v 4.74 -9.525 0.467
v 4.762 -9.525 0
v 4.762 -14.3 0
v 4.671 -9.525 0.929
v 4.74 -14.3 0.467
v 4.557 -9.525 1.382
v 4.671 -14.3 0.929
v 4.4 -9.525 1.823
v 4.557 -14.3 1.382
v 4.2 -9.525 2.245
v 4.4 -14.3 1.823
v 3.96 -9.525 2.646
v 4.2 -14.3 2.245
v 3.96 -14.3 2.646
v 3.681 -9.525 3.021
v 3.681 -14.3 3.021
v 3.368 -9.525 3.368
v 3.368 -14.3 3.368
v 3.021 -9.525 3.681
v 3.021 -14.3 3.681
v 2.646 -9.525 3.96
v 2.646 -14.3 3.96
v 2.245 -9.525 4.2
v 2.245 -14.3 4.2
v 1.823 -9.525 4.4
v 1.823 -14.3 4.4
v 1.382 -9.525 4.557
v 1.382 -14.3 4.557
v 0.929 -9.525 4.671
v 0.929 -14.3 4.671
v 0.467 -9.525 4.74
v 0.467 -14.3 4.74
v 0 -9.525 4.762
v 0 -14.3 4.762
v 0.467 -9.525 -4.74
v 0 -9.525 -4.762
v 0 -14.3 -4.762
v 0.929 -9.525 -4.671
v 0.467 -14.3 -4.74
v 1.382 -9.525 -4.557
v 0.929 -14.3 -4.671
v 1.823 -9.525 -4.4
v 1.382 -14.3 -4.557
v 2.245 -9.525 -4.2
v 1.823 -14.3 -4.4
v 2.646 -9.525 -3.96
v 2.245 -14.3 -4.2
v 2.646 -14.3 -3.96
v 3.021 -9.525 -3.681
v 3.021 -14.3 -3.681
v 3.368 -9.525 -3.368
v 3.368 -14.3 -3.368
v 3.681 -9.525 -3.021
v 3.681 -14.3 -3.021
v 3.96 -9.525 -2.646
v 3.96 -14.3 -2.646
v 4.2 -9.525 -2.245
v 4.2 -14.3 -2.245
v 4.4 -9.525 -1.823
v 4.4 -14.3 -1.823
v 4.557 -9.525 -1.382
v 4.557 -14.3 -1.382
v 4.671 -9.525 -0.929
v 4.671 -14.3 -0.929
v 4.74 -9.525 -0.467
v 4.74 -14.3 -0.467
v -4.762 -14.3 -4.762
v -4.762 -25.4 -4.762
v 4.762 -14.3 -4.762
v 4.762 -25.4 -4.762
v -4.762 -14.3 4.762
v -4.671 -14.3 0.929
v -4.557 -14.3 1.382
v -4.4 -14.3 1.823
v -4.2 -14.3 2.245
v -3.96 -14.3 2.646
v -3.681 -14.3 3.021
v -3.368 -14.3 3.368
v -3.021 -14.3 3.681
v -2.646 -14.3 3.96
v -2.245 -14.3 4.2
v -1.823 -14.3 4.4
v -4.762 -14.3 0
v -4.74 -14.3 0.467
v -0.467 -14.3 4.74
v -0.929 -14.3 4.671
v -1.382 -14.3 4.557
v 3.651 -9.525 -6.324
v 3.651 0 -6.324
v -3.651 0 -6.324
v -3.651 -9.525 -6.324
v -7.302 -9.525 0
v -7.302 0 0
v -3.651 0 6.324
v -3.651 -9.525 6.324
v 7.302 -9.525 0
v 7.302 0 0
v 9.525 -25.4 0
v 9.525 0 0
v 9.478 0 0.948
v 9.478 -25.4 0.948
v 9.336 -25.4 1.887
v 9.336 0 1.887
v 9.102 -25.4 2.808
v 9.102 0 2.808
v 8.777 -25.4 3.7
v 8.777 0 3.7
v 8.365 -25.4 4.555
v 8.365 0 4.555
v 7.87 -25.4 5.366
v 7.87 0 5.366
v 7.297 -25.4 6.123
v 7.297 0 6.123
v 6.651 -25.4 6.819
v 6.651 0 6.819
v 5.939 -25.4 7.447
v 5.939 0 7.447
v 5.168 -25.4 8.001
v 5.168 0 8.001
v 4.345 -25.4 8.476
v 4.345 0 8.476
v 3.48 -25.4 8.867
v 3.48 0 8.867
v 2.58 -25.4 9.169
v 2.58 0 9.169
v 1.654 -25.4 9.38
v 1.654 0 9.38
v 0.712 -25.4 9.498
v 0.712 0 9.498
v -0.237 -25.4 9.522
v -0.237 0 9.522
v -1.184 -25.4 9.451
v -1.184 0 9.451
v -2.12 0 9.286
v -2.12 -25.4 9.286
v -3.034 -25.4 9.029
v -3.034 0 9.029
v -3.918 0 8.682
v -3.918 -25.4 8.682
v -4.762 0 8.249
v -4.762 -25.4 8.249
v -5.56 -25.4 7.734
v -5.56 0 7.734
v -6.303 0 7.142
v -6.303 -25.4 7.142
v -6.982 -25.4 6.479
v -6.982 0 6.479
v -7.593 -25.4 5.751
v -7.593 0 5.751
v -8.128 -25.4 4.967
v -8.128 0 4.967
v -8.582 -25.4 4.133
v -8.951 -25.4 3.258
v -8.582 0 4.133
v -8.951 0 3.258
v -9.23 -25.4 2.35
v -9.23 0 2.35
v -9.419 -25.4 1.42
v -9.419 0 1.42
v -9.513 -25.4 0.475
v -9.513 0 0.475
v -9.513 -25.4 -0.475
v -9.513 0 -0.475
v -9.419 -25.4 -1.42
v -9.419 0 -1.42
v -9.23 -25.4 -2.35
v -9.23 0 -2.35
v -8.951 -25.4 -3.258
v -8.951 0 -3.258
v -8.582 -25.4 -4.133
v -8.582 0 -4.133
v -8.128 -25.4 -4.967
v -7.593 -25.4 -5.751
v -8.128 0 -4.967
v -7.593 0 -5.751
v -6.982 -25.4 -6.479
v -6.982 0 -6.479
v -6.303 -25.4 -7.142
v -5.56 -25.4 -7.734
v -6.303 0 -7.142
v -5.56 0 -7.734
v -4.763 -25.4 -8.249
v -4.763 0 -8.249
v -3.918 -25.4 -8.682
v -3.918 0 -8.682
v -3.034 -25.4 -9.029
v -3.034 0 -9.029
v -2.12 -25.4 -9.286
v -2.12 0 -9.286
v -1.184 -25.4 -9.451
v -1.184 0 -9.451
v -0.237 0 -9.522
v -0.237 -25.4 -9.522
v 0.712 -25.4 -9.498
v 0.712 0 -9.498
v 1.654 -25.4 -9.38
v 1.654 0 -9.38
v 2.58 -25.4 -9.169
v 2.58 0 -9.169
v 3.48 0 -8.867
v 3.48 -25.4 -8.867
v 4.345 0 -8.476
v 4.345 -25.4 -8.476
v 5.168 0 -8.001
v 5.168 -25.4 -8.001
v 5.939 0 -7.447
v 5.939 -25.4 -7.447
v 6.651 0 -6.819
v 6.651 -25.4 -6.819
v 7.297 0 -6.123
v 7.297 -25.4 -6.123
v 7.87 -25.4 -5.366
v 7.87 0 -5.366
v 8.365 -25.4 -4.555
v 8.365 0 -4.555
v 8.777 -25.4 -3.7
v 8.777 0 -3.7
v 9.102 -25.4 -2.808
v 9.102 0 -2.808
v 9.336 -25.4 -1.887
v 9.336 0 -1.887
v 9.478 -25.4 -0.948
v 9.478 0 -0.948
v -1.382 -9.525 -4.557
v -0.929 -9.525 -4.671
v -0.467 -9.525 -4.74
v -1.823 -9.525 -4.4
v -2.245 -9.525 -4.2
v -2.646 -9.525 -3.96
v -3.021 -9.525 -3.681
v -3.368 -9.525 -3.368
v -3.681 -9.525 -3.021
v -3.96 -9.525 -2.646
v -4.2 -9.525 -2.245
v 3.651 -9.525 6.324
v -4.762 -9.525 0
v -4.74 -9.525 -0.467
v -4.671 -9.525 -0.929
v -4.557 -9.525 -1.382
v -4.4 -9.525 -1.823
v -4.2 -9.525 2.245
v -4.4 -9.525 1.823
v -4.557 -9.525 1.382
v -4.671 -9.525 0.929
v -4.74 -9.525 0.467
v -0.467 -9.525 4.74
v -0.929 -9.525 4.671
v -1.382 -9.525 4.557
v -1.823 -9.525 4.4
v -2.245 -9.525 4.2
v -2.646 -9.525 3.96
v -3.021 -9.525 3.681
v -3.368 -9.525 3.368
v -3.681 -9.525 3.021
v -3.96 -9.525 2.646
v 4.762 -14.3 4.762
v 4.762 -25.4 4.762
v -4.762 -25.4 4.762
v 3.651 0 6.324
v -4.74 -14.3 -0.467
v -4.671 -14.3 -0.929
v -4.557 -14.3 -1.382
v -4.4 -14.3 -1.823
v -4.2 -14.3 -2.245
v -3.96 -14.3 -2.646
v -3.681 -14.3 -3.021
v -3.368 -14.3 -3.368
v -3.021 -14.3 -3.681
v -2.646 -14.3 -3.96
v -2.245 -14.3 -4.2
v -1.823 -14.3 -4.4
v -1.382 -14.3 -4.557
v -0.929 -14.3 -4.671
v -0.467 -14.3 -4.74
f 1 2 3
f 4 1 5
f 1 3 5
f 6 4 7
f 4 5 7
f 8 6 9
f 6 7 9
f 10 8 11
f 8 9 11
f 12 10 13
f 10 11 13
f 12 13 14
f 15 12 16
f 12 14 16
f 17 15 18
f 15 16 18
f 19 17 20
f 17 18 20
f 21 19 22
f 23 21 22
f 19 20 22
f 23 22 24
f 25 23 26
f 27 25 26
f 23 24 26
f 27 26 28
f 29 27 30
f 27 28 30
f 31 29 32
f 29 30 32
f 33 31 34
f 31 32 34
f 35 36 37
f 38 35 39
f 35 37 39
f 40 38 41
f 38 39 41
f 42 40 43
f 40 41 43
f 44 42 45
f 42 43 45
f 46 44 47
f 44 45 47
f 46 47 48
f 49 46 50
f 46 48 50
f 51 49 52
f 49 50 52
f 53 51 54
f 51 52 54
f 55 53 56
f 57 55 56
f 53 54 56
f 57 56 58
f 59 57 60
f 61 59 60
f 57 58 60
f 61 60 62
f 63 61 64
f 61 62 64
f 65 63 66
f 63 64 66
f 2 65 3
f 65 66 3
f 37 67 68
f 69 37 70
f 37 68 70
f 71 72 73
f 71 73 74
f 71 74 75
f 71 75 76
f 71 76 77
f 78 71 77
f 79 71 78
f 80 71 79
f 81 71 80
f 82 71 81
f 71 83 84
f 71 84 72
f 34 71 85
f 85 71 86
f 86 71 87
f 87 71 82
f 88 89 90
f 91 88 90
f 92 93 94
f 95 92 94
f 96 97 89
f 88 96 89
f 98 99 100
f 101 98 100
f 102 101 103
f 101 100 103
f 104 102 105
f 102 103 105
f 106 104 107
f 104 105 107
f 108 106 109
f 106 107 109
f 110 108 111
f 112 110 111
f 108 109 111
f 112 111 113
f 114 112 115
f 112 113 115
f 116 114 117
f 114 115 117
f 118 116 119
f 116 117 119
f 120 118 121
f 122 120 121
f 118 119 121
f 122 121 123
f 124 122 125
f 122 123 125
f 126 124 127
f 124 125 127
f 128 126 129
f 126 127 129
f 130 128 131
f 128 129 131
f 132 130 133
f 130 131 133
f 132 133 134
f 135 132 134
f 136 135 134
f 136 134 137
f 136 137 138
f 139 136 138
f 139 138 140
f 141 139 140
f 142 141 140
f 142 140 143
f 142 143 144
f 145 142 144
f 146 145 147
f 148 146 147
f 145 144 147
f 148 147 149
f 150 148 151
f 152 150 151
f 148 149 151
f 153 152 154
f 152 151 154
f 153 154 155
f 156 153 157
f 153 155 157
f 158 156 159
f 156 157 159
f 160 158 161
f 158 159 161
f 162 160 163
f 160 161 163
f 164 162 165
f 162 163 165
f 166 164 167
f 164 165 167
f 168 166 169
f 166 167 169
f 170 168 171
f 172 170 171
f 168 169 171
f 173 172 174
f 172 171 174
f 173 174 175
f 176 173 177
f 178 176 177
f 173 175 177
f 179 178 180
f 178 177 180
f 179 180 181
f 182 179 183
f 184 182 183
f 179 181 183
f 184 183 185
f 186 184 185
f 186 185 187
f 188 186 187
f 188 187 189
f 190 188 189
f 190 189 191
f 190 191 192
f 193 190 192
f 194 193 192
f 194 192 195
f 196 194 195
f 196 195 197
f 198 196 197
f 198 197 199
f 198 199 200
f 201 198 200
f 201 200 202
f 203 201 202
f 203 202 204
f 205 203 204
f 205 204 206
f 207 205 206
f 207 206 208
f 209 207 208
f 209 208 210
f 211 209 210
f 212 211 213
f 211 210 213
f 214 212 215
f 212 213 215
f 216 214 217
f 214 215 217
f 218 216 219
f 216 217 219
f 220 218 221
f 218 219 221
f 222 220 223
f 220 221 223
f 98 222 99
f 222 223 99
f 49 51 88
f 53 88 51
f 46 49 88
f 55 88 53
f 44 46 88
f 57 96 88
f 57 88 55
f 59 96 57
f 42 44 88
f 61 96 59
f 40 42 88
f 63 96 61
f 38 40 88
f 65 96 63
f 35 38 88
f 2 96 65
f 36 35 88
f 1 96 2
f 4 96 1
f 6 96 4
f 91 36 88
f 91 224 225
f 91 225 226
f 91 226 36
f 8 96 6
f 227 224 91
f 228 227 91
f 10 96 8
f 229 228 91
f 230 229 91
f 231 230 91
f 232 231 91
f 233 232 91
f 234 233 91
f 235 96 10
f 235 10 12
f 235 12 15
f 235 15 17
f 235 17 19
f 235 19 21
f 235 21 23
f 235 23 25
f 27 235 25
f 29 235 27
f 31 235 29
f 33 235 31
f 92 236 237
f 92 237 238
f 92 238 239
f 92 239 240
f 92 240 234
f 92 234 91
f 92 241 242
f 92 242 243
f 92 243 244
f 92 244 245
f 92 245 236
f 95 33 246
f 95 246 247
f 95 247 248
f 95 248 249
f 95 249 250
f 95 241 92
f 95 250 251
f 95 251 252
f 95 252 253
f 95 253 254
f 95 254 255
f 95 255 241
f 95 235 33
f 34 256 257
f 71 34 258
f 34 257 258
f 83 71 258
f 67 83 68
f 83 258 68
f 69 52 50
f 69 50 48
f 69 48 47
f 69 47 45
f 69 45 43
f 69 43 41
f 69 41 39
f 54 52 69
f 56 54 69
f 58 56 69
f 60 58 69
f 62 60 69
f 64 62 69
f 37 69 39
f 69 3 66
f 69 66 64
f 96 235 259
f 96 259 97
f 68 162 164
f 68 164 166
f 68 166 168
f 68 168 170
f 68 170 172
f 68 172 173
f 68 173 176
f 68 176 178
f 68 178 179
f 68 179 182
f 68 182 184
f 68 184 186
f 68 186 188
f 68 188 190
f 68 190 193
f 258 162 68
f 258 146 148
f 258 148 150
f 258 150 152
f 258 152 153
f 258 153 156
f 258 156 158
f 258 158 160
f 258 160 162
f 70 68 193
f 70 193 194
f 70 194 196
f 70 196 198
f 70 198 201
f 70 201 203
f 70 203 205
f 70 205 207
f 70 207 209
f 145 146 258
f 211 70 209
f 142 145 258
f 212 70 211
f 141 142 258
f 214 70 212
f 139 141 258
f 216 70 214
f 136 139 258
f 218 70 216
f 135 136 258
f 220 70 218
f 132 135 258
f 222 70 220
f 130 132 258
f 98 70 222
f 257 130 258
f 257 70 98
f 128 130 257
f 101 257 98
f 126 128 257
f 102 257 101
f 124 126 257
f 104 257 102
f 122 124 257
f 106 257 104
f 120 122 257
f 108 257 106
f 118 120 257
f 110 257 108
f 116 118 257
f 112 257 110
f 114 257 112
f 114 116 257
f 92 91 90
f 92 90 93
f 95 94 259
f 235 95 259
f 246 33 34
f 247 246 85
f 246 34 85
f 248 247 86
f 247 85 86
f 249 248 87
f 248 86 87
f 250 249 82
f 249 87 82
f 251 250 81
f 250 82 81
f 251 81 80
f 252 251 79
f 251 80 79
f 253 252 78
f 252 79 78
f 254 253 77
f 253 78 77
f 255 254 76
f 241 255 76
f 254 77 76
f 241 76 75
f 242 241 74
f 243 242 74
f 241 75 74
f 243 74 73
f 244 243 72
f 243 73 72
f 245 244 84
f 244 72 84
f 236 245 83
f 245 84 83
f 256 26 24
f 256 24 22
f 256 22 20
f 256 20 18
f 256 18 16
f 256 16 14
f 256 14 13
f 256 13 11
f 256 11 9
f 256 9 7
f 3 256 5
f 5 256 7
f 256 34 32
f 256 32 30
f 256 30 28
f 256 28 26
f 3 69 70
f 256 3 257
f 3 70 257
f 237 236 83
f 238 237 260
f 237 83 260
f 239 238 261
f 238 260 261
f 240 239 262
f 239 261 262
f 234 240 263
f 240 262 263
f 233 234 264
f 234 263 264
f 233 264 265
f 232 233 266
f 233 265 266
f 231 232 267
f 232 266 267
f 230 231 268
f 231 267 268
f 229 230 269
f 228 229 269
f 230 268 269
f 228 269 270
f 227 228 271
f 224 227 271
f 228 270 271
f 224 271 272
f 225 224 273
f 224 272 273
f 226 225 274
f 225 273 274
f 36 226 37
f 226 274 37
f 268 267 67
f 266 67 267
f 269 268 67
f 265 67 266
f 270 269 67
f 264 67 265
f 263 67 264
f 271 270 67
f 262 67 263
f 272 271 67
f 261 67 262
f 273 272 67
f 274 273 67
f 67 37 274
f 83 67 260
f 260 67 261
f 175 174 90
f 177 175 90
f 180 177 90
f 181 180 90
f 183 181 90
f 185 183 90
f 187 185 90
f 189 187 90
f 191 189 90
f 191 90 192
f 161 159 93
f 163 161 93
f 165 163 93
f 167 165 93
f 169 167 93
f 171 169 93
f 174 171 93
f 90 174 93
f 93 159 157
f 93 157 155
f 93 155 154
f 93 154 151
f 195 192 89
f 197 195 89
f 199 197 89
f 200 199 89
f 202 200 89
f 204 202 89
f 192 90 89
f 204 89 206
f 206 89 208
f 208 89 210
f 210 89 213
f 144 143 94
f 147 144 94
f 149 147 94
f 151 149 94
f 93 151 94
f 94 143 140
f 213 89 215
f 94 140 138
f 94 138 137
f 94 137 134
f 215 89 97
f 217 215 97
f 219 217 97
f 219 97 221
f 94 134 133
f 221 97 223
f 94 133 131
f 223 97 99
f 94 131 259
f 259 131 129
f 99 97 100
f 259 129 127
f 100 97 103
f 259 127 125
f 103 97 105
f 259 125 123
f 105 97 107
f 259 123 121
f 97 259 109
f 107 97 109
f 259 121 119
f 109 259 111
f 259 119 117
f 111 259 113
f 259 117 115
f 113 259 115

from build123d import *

# Parameters (mm, degrees)
F0_R     = 9.525
F1_DEPTH = 25.4
F3_DEPTH = 25.401
F4_DEPTH = 11.0998
F6_DEPTH = 9.525


with BuildPart() as f1:
    # F0 (on Front) → F1 (new body)
    with BuildSketch(Plane.XZ):
        Circle(F0_R)
    extrude(amount=F1_DEPTH)

    # F2 (on face) → F3 (cut, through all)
    with BuildSketch(Plane.XZ.offset(25.4)):
        with BuildLine():
            ThreePointArc((-4.7625, 0), (-3.367596, -3.367596), (0, -4.7625))
            ThreePointArc((0, -4.7625), (3.367596, -3.367596), (4.7625, 0))
            ThreePointArc((4.7625, 0), (3.367596, 3.367596), (0, 4.7625))
            ThreePointArc((0, 4.7625), (-3.367596, 3.367596), (-4.7625, 0))
        make_face()
    extrude(amount=-F3_DEPTH, mode=Mode.SUBTRACT)

    # F2 (on face) → F4 (cut)
    with BuildSketch(Plane.XZ.offset(25.4)):
        with BuildLine():
            Line((0, -4.7625), (4.7625, -4.7625))
            Line((4.7625, -4.7625), (4.7625, 0))
            ThreePointArc((4.7625, 0), (3.367596, -3.367596), (0, -4.7625))
        make_face()
        with BuildLine():
            Line((-4.7625, -4.7625), (0, -4.7625))
            ThreePointArc((0, -4.7625), (-3.367596, -3.367596), (-4.7625, 0))
            Line((-4.7625, 0), (-4.7625, -4.7625))
        make_face()
        with BuildLine():
            ThreePointArc((0, 4.7625), (3.367596, 3.367596), (4.7625, 0))
            Line((4.7625, 0), (4.7625, 4.7625))
            Line((4.7625, 4.7625), (0, 4.7625))
        make_face()
        with BuildLine():
            Line((-4.7625, 4.7625), (-4.7625, 0))
            ThreePointArc((-4.7625, 0), (-3.367596, 3.367596), (0, 4.7625))
            Line((0, 4.7625), (-4.7625, 4.7625))
        make_face()
    extrude(amount=-F4_DEPTH, mode=Mode.SUBTRACT)

    # F5 (on face) → F6 (cut)
    with BuildSketch(Plane(origin=(0, 0, 0), x_dir=(-1, 0, 0), z_dir=(0, 1, 0))):
        Polygon((7.3025, -0.000211), (3.651432, 6.324045), (-3.651068, 6.324256), (-7.3025, 0.000211), (-3.651432, -6.324045), (3.651068, -6.324256), align=None)
    extrude(amount=-F6_DEPTH, mode=Mode.SUBTRACT)


solid = f1.part
